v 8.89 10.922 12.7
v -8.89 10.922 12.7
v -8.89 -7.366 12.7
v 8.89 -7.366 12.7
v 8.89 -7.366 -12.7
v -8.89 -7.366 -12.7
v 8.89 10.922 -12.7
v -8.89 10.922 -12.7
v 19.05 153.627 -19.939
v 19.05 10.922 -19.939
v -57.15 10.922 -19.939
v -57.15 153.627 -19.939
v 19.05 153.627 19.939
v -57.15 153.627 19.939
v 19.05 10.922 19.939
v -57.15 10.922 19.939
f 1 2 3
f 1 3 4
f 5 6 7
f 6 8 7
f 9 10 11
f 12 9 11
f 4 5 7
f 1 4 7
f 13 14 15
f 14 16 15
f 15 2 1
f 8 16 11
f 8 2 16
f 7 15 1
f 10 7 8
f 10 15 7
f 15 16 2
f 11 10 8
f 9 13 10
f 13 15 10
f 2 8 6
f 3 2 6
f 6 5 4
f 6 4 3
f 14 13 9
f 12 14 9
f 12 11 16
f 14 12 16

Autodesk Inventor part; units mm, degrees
ref_plane "XZ Plane" through (0, 0, 0) normal (0, 1, 0) x (-1, 0, 0)
sketch "Sketch1" plane through (0, 0, 0) normal (0, 0, 1) x (1, 0, 0)
  circle A0 centre (0, 0) radius 3.175 projected
  line L0 (5.0349, -7.366) -> (-5.0349, -7.366) projected
  line L1 (-8.89, 10.922) -> (-8.89, -7.366) projected
  line L2 (8.89, -7.366) -> (8.89, 10.922) projected
  line L3 (-37.211, 10.922) -> (12.7, 10.922) construction
  line L4 (-8.89, 10.922) -> (8.89, 10.922)
  line L5 (8.89, 10.922) -> (8.89, -7.366)
  line L6 (8.89, -7.366) -> (-8.89, -7.366)
  line L7 (-8.89, -7.366) -> (-8.89, 10.922)
extrude "Extrusion1" add sketch "Sketch1" along normal mid plane 25.4 contours A0 | L0 L6 L1 L4 L2
ref_plane "Work Plane1" through (15.0814, 10.922, 0) normal (0, -1, 0) x (0, 0, -1)
sketch "Sketch3" plane through (15.0814, 10.922, 0) normal (0, -1, 0) x (0, 0, -1)
  line L0 (-19.939, 3.9686) -> (19.939, 3.9686)
  line L1 (19.939, 3.9686) -> (19.939, -72.2314)
  line L2 (19.939, -72.2314) -> (-19.939, -72.2314)
  line L3 (-19.939, -72.2314) -> (-19.939, 3.9686)
  line L4 (-9.525, 3.9686) -> (9.525, 3.9686) construction
  arc A0 (-19.939, -52.2924) -> (19.939, -52.2924) centre (0, -52.2924) ccw construction
  point P0 (0, -15.0814)
  point P1 (-19.939, -2.3814)
  point P2 (19.939, -2.3814)
extrude "Extrusion2" add sketch "Sketch3" against normal blind 142.705
properties part number "UpperArmActuatorBaseBoundingBox"
